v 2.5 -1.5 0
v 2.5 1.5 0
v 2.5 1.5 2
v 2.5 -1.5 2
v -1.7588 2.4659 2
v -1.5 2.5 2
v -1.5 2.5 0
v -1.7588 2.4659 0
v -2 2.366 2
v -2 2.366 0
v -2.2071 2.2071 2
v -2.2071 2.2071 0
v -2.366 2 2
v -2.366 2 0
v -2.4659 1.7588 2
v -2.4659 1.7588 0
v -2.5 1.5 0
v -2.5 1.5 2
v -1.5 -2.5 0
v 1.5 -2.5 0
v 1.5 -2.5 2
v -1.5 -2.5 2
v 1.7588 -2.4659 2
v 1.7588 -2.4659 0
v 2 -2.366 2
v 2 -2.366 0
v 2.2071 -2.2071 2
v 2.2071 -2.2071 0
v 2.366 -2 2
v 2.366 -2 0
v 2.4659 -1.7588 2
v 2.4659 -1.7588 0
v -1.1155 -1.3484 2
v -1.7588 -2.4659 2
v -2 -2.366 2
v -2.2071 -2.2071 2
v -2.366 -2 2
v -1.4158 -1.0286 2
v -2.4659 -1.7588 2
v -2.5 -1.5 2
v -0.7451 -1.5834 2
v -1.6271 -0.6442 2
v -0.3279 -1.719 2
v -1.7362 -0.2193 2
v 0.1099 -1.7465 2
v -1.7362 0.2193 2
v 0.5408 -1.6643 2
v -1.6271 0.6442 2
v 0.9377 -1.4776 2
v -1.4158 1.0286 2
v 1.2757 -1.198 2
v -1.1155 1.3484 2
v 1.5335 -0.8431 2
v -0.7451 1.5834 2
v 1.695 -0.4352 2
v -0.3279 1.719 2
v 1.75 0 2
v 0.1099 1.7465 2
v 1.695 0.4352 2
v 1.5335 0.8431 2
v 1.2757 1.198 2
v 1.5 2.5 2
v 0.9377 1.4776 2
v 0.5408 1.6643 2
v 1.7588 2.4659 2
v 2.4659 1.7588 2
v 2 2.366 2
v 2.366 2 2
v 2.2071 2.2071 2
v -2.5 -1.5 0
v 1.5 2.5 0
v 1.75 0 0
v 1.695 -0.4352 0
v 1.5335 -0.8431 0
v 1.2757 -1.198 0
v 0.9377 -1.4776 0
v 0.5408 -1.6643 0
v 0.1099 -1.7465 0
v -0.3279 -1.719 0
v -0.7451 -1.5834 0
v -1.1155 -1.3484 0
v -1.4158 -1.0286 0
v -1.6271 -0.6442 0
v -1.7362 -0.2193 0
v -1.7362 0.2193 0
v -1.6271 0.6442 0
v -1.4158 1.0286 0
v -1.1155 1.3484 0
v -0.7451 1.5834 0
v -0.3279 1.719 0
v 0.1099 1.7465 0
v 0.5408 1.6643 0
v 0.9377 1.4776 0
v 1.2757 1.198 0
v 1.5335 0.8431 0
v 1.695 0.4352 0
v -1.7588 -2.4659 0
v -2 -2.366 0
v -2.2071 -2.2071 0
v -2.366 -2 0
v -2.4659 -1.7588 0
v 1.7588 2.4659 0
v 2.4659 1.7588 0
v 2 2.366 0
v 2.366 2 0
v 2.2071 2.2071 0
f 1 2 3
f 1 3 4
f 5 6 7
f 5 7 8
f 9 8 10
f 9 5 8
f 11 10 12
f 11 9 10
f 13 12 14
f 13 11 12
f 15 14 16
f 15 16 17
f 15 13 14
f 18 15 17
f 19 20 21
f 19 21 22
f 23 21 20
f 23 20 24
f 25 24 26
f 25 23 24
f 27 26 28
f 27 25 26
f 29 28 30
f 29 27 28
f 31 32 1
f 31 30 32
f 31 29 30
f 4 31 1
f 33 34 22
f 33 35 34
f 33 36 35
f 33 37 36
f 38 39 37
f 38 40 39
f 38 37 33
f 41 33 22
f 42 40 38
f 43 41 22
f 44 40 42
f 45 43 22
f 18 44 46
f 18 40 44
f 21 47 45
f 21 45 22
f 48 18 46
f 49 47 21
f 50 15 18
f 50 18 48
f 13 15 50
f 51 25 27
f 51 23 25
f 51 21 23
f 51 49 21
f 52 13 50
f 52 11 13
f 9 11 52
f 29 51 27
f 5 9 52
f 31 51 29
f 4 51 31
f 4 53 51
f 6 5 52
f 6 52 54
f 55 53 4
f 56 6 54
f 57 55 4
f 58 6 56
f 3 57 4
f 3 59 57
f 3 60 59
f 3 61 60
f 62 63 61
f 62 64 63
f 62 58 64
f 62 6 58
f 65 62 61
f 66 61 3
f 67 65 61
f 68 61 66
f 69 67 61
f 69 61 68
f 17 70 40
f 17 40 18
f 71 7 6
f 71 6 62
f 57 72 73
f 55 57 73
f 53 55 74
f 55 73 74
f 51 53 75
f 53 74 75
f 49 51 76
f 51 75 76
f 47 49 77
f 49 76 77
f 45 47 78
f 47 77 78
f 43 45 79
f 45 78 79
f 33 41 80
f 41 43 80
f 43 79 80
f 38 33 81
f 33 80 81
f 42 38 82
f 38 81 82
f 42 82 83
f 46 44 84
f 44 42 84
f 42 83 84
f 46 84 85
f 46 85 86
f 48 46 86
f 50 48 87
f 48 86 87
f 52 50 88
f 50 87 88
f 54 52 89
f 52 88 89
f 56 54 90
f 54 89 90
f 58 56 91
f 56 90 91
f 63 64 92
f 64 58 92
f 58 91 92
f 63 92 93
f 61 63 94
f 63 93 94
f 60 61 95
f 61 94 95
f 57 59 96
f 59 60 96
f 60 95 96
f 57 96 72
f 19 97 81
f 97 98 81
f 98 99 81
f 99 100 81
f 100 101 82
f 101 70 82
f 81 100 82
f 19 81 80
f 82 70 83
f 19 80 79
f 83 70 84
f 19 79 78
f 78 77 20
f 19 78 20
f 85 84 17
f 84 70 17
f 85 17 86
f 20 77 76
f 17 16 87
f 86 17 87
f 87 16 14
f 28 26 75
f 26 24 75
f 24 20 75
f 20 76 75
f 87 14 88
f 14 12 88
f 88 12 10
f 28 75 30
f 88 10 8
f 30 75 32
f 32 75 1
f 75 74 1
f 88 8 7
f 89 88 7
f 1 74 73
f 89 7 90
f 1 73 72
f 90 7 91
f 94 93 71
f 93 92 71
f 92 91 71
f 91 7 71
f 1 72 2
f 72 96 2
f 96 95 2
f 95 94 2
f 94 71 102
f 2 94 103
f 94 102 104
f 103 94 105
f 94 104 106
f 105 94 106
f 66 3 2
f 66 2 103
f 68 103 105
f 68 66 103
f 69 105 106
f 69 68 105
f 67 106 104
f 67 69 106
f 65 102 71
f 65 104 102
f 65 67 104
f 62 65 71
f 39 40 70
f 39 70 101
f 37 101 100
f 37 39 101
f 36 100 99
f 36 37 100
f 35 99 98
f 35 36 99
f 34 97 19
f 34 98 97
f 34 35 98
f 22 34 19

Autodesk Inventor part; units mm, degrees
ref_plane "YZ Plane" through (0, 0, 0) normal (1, 0, 0) x (0, 1, 0)
ref_plane "XZ Plane" through (0, 0, 0) normal (0, 1, 0) x (-1, 0, 0)
ref_plane "XY Plane" through (0, 0, 0) normal (0, 0, 1) x (1, 0, 0)
sketch "Skizze1" plane through (0, 0, 0) normal (0, 0, 1) x (1, 0, 0)
  circle A0 centre (0, 0) radius 1.75
  line L0 (-2.5, 2.5) -> (2.5, 2.5)
  line L1 (2.5, 2.5) -> (2.5, -2.5)
  line L2 (2.5, -2.5) -> (-2.5, -2.5)
  line L3 (-2.5, -2.5) -> (-2.5, 2.5)
  line L4 (-2.5, 2.5) -> (2.5, -2.5) construction
  dimension "d0" = 3.5
  dimension "d1" = 5
extrude "Extrusion1" add sketch "Skizze1" along normal blind 2
fillet "Rundung1" radius 1 4 edges at (2.5, 2.5, 1) (2.5, -2.5, 1) (-2.5, 2.5, 1) (-2.5, -2.5, 1)
properties part number "Abstandshalter US Sensor" material "ABS-Kunststoff"
